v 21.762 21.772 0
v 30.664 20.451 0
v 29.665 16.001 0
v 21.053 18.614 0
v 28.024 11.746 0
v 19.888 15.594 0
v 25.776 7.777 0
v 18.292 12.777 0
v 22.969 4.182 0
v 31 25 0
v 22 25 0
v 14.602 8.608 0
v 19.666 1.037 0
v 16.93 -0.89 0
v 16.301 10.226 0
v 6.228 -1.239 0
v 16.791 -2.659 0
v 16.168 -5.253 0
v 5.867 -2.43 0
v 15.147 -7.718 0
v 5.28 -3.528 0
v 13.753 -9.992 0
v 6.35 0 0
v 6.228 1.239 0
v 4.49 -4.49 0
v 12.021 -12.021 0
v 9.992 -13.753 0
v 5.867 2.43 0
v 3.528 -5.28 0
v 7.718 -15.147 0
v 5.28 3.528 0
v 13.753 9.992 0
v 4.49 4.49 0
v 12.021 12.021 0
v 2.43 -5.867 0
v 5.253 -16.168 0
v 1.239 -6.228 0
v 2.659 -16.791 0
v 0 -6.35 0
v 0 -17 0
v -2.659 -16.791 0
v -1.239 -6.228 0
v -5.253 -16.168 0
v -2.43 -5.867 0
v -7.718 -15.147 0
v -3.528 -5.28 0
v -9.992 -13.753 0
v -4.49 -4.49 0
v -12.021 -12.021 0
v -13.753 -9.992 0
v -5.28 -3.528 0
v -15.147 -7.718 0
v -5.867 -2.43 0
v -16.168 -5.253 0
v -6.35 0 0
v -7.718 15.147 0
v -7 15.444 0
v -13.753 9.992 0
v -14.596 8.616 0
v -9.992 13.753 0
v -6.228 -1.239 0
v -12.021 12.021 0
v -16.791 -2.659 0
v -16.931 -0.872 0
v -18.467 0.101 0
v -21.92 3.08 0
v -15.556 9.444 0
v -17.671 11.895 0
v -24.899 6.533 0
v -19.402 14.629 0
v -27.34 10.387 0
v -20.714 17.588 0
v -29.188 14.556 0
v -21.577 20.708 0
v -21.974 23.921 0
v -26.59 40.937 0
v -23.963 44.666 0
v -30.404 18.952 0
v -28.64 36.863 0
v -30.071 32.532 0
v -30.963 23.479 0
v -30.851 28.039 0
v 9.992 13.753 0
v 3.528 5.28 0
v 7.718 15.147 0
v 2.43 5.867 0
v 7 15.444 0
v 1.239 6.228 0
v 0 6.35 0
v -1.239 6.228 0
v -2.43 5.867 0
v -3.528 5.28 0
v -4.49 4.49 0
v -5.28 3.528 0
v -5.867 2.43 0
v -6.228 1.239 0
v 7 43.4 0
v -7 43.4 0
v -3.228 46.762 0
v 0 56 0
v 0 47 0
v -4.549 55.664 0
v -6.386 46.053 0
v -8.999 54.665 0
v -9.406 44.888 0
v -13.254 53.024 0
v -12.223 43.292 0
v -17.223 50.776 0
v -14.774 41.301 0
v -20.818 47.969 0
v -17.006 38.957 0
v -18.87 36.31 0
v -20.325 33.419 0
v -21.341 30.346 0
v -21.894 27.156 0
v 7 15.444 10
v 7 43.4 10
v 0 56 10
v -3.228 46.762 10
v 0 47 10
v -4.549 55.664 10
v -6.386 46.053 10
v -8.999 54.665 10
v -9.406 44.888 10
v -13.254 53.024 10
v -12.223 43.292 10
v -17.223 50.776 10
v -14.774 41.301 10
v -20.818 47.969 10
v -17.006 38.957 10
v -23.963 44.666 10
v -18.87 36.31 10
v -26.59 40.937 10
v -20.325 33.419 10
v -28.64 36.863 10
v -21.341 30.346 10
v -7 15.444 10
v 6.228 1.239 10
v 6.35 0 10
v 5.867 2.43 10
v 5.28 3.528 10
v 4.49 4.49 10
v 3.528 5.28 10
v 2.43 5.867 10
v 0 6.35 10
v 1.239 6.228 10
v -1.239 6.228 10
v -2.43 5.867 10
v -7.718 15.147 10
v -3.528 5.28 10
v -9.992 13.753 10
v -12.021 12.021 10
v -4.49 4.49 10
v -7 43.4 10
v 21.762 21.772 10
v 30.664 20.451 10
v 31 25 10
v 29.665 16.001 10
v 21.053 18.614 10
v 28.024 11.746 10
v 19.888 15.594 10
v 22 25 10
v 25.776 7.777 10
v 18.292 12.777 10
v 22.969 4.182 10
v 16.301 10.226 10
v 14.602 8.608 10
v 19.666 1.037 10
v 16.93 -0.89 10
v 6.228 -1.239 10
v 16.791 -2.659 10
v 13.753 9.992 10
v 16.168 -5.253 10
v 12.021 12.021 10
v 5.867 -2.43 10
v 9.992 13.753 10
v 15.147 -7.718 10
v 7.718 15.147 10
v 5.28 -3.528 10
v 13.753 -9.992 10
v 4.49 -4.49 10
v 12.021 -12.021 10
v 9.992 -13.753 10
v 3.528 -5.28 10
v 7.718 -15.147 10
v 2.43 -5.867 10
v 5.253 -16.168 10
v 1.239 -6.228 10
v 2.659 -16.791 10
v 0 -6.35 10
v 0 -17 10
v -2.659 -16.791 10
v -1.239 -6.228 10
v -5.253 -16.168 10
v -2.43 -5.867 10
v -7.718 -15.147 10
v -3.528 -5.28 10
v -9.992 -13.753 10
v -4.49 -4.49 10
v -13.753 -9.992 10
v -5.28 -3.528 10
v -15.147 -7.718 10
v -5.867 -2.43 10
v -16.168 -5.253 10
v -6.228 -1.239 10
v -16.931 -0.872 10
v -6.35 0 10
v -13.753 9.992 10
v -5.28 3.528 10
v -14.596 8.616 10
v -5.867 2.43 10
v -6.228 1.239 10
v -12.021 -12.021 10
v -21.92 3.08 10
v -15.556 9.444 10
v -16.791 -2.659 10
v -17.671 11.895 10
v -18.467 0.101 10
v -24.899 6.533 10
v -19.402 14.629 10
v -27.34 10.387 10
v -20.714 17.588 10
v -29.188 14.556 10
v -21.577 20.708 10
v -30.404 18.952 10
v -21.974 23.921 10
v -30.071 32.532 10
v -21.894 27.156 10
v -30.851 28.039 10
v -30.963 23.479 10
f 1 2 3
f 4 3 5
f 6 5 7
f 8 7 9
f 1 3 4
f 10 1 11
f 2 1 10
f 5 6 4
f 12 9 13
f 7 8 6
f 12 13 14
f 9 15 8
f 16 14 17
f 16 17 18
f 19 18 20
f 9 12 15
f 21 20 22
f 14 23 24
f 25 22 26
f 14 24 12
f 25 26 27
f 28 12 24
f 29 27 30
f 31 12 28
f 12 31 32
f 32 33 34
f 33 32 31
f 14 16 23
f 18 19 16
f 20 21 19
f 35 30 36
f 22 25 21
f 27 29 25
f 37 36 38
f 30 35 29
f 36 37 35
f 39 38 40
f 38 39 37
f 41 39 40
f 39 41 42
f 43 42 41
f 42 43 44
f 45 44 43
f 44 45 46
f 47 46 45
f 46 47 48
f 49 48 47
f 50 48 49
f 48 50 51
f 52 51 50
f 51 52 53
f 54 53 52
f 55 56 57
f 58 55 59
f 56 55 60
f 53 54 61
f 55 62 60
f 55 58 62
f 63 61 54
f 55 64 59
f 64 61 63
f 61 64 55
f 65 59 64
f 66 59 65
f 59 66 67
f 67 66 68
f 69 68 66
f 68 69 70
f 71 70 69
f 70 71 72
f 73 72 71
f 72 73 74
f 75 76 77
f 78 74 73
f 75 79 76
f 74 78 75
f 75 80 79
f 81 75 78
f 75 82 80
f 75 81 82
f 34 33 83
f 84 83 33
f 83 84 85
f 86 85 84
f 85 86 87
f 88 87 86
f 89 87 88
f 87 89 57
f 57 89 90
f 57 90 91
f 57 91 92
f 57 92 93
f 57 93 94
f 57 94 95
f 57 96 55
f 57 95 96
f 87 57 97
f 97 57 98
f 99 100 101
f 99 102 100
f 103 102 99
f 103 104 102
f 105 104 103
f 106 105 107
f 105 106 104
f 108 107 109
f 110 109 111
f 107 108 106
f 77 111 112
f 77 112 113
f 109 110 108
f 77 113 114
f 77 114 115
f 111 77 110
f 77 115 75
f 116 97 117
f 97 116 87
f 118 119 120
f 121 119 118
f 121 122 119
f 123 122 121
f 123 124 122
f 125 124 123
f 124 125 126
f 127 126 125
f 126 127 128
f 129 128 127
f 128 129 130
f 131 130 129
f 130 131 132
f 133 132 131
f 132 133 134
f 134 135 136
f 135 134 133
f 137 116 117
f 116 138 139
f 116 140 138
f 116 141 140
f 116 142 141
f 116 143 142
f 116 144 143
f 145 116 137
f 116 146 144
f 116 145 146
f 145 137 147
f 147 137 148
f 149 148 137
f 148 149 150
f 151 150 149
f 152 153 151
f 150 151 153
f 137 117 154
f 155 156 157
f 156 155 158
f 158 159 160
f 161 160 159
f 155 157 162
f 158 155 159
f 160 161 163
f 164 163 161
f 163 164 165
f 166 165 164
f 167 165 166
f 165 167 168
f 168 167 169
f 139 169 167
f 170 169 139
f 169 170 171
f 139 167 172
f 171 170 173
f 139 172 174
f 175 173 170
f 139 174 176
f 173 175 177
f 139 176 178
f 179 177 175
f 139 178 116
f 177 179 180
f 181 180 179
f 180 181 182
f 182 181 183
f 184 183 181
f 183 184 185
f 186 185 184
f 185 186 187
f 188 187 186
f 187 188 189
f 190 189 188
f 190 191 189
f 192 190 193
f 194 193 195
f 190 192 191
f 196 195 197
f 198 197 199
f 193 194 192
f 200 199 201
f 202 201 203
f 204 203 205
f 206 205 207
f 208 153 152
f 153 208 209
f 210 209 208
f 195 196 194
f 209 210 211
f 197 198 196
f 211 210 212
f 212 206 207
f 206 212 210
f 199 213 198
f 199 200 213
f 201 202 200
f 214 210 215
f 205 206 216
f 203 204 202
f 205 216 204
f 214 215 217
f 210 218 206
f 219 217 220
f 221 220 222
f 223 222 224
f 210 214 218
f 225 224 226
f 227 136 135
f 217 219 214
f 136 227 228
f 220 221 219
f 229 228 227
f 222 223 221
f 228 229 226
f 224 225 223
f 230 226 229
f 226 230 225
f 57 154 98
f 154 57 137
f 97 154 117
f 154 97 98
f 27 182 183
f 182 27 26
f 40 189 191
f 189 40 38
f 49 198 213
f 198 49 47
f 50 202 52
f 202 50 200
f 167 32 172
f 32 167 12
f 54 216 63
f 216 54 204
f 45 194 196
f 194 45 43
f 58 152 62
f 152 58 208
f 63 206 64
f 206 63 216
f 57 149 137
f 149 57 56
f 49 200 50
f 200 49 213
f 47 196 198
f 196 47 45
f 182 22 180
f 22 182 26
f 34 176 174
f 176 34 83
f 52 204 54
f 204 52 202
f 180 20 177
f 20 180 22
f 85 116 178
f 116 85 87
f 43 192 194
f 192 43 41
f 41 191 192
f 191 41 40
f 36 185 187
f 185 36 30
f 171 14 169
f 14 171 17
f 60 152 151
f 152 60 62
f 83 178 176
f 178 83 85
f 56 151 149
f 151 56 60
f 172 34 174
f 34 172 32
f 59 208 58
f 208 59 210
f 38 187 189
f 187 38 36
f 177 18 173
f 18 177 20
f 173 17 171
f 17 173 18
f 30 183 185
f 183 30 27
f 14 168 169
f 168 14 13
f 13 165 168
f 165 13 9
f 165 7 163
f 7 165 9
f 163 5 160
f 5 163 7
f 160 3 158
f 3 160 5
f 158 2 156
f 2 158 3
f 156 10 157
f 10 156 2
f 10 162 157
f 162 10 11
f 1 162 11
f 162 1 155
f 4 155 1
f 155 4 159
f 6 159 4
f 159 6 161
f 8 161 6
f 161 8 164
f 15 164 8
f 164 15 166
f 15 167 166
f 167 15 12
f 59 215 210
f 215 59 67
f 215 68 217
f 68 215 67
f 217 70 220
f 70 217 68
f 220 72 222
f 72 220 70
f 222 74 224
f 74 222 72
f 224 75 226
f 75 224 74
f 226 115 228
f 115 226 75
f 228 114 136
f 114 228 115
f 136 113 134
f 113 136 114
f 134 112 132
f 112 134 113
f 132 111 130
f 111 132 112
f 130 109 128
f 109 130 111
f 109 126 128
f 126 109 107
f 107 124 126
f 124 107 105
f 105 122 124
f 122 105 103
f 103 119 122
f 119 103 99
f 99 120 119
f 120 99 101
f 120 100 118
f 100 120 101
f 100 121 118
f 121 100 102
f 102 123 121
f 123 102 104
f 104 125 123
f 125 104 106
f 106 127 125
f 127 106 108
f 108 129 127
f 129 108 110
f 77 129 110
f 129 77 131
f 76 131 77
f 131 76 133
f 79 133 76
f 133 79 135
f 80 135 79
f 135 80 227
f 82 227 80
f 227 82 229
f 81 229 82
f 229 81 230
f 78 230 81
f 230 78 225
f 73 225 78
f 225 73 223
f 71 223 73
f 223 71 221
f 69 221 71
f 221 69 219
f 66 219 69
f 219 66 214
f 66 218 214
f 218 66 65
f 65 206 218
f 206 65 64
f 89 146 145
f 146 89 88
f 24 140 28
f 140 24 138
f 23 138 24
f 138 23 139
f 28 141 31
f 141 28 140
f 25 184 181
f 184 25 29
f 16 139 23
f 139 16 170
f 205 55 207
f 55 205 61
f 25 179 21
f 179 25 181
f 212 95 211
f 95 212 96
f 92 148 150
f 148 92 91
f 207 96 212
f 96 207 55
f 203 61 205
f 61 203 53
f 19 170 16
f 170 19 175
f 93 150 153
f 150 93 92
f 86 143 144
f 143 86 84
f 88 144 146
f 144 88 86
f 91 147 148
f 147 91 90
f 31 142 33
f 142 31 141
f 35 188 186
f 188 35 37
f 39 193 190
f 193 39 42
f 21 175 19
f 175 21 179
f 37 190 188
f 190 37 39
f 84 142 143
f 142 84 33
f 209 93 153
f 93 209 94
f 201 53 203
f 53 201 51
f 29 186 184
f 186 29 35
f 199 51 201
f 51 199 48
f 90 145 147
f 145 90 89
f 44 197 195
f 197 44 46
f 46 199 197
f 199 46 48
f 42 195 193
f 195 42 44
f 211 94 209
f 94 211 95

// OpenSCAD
$fn = 32;

// ----------------------------------------------------------------------
// Hook: 50 mm shank into a 22 mm curl, 10 mm thick
// ----------------------------------------------------------------------

// --- parameters (mm) ---
shank_len = 50;           // shank length from the boss centre
shank_w = 14;             // shank width
boss_d = 34;              // boss diameter
bore_d = 12.7;            // boss bore
curl_in = 22;             // curl inner radius
curl_out = 31;            // curl outer radius
curl_sweep = 270;         // curl sweep angle
hook_t = 10;              // hook thickness

shank_profile = [[-7, 43.4], [7, 43.4], [7, 15], [-7, 15]];
boss_profile = [[17, 0], [16.791, 2.659], [16.168, 5.253], [15.147, 7.718], [13.753, 9.992], [12.021, 12.021], [9.992, 13.753], [7.718, 15.147], [5.253, 16.168], [2.659, 16.791], [0, 17], [-2.659, 16.791], [-5.253, 16.168], [-7.718, 15.147], [-9.992, 13.753], [-12.021, 12.021], [-13.753, 9.992], [-15.147, 7.718], [-16.168, 5.253], [-16.791, 2.659], [-17, 0], [-16.791, -2.659], [-16.168, -5.253], [-15.147, -7.718], [-13.753, -9.992], [-12.021, -12.021], [-9.992, -13.753], [-7.718, -15.147], [-5.253, -16.168], [-2.659, -16.791], [0, -17], [2.659, -16.791], [5.253, -16.168], [7.718, -15.147], [9.992, -13.753], [12.021, -12.021], [13.753, -9.992], [15.147, -7.718], [16.168, -5.253], [16.791, -2.659]];
curl_profile = [[0, 56], [-4.549, 55.664], [-8.999, 54.665], [-13.254, 53.024], [-17.223, 50.776], [-20.818, 47.969], [-23.963, 44.666], [-26.59, 40.937], [-28.64, 36.863], [-30.071, 32.532], [-30.851, 28.039], [-30.963, 23.479], [-30.404, 18.952], [-29.188, 14.556], [-27.34, 10.387], [-24.899, 6.533], [-21.92, 3.08], [-18.467, 0.101], [-14.613, -2.34], [-10.444, -4.188], [-6.048, -5.404], [-1.521, -5.963], [3.039, -5.851], [7.532, -5.071], [11.863, -3.64], [15.937, -1.59], [19.666, 1.037], [22.969, 4.182], [25.776, 7.777], [28.024, 11.746], [29.665, 16.001], [30.664, 20.451], [31, 25], [22, 25], [21.762, 21.772], [21.053, 18.614], [19.888, 15.594], [18.292, 12.777], [16.301, 10.226], [13.957, 7.994], [11.31, 6.13], [8.419, 4.675], [5.346, 3.659], [2.156, 3.106], [-1.079, 3.026], [-4.292, 3.423], [-7.412, 4.286], [-10.371, 5.598], [-13.105, 7.329], [-15.556, 9.444], [-17.671, 11.895], [-19.402, 14.629], [-20.714, 17.588], [-21.577, 20.708], [-21.974, 23.921], [-21.894, 27.156], [-21.341, 30.346], [-20.325, 33.419], [-18.87, 36.31], [-17.006, 38.957], [-14.774, 41.301], [-12.223, 43.292], [-9.406, 44.888], [-6.386, 46.053], [-3.228, 46.762], [0, 47]];

difference() {
  union() {
    /* three overlapping outlines: shank, boss and the smooth curl */
    linear_extrude(height = hook_t) polygon(shank_profile);
    linear_extrude(height = hook_t) polygon(boss_profile);
    linear_extrude(height = hook_t) polygon(curl_profile);
  }
  translate([0, 0, -2.5]) cylinder(h = hook_t + 5, d = bore_d);
}
